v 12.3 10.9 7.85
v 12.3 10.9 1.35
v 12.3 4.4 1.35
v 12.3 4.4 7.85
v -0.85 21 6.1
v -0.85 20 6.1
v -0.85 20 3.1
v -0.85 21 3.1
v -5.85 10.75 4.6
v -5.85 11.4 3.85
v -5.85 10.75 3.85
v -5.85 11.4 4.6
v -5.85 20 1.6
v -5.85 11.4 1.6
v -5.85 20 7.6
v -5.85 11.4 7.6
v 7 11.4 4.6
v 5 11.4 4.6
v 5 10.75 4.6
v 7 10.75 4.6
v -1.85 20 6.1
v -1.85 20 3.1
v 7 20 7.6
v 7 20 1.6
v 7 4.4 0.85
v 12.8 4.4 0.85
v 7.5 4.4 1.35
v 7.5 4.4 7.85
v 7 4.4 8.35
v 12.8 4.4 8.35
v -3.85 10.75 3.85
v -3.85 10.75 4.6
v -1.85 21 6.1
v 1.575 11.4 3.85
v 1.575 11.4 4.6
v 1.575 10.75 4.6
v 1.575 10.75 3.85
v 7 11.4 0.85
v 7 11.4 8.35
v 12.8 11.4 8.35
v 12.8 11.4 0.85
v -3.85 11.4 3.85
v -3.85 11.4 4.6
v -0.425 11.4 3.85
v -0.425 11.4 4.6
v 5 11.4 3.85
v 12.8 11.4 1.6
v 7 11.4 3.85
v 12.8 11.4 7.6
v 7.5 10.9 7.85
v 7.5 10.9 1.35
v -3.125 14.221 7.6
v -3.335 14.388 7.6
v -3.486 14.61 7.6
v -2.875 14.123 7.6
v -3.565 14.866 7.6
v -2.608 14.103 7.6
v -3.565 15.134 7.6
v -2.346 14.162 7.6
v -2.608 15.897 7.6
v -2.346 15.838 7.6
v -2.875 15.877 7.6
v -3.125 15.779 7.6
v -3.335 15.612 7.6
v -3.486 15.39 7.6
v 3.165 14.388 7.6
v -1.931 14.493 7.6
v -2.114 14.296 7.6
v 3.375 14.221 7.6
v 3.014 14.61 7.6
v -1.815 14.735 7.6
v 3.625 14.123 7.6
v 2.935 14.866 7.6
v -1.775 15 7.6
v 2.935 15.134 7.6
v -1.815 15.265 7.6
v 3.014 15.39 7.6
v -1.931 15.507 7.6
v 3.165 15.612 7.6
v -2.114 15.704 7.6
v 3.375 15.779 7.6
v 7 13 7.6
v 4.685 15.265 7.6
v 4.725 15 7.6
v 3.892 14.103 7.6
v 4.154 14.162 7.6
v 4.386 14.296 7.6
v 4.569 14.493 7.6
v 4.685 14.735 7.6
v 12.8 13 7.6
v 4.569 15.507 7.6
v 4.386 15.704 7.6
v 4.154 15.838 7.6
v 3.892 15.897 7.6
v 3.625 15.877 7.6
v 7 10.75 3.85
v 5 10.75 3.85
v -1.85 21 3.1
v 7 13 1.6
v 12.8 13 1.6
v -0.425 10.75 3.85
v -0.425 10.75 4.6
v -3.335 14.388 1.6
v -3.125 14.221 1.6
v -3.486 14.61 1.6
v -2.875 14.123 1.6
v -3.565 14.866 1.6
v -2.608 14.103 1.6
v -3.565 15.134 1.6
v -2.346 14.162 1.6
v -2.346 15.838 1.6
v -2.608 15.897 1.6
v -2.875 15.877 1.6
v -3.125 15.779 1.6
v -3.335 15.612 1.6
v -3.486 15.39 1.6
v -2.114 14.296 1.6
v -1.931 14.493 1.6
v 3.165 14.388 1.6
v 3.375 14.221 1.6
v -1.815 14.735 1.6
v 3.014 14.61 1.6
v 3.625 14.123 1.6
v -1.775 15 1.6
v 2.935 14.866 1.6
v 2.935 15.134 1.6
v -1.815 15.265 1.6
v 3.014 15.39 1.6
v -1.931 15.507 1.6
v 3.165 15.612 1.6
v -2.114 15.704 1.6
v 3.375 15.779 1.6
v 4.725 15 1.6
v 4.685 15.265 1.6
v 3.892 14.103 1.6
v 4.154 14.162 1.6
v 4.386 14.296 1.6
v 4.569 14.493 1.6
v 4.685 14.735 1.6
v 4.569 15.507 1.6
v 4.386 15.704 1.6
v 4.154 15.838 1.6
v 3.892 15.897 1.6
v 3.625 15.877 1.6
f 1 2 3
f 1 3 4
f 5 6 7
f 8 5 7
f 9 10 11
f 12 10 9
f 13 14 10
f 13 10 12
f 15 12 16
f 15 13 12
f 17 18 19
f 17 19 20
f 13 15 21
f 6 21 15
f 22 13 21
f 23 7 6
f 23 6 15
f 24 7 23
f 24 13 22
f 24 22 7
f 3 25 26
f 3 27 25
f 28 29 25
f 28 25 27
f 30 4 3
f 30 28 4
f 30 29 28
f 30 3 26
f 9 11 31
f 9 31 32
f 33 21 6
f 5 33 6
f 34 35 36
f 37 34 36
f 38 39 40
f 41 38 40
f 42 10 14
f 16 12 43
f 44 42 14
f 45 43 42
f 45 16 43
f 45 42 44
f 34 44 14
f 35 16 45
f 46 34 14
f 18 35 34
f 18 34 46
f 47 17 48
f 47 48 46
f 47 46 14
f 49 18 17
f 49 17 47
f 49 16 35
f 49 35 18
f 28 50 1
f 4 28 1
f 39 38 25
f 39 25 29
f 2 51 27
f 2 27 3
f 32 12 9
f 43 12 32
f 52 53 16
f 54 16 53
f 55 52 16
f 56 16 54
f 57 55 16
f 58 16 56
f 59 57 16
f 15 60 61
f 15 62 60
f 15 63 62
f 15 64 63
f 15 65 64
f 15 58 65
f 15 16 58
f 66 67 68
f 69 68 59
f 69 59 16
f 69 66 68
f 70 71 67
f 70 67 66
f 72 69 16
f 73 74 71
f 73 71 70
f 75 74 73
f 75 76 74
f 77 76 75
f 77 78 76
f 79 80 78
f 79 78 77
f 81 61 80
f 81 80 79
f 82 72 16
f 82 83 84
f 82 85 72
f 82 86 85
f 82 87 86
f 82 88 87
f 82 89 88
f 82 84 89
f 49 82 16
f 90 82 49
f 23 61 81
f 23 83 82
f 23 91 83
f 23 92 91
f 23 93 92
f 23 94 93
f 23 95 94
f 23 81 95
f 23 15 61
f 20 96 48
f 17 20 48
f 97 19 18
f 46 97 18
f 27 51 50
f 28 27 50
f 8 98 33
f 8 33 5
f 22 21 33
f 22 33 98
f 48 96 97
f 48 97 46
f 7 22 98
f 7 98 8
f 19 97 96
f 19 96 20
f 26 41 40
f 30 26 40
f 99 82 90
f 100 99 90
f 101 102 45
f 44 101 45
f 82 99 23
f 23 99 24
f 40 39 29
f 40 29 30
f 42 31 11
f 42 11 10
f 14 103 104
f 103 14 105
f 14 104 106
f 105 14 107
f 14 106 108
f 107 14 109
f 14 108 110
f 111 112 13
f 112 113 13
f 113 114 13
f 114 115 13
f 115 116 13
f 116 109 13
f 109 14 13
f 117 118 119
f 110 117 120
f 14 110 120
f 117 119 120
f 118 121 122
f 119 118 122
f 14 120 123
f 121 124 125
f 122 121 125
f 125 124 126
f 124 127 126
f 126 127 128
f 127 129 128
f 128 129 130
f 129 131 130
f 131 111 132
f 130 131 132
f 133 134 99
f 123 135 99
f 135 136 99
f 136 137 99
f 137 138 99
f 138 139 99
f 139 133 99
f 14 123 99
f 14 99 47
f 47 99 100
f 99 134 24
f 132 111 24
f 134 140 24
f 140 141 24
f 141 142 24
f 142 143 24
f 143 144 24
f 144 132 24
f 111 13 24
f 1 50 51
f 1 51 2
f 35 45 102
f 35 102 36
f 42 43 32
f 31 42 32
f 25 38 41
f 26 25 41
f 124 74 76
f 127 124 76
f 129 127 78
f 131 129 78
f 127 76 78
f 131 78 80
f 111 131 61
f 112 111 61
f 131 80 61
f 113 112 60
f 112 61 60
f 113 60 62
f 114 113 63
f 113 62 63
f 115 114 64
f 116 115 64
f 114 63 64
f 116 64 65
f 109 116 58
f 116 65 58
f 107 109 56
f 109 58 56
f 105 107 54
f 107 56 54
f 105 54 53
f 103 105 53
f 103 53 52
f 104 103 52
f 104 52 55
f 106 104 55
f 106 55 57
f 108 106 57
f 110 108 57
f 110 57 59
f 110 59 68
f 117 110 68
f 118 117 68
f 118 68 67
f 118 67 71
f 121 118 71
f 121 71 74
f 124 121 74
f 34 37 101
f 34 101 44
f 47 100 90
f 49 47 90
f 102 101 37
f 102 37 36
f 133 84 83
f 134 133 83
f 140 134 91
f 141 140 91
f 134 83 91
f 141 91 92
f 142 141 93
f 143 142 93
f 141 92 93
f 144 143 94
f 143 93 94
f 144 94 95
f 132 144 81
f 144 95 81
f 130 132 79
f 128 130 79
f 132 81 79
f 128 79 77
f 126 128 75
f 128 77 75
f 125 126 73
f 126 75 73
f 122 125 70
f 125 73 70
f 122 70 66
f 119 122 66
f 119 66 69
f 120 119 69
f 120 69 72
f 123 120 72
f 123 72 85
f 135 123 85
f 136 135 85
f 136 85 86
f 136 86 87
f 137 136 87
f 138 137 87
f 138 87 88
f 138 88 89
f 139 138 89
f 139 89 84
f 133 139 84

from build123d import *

# Parameters (mm, degrees)
SKETCH1_R           = 1.5
BOSS_EXTRUDE1_DEPTH = 1.6
SKETCH2_W           = 12.85
SKETCH2_H           = 10
BOSS_EXTRUDE2_DEPTH = 6
SKETCH3_W           = 12.85
SKETCH3_H           = 3
CUT_EXTRUDE1_DEPTH  = 3
CUT_EXTRUDE3_DEPTH  = 3
SKETCH5_W           = 2.25
SKETCH5_H           = 2.25
CUT_EXTRUDE4_DEPTH  = 17
BOSS_EXTRUDE4_DEPTH = 4.75
SKETCH11_W          = 12.85
SKETCH11_H          = 10
CUT_EXTRUDE8_DEPTH  = 4.75
SKETCH_1_W          = 10
SKETCH_1_H          = 7
EXTRUDE_1_DEPTH     = 5.8
CUT_EXTRUDE_1_DEPTH = 19
SKETCH_4_R          = 0.9
CUT_EXTRUDE_2_DEPTH = 7
SKETCH_5_W          = 18.65
SKETCH_5_H          = 6
EXTRUDE_3_DEPTH     = 1.6
SKETCH_6_W          = 5.8
SKETCH_6_H          = 7.5
EXTRUDE_4_DEPTH     = 7
SKETCH_2_W          = 1
SKETCH_2_H          = 3
EXTRUDE_2_DEPTH     = 1
SHELL_1_T           = -0.5


with BuildPart() as part:
    # Sketch1 → Boss-Extrude1 (new body)
    with BuildSketch(Plane.XY):
        with BuildLine():
            Line((-7, 20), (7, 20))
            ThreePointArc((7, 20), (8.414213562, 19.414213562), (9, 18))
            Line((9, 18), (9, 2))
            ThreePointArc((9, 2), (8.414213562, 0.585786438), (7, 0))
            Line((7, 0), (-7, 0))
            ThreePointArc((-7, 0), (-8.414213562, 0.585786438), (-9, 2))
            Line((-9, 2), (-9, 18))
            ThreePointArc((-9, 18), (-8.414213562, 19.414213562), (-7, 20))
        make_face()
        with Locations((7, 5)):
            Circle(SKETCH1_R, mode=Mode.SUBTRACT)
        with Locations((-7, 5)):
            Circle(SKETCH1_R, mode=Mode.SUBTRACT)
    extrude(amount=BOSS_EXTRUDE1_DEPTH)

    # Sketch2 → Boss-Extrude2 (add)
    with BuildSketch(Plane.XY.offset(1.6)):
        with Locations((0.575, 15)):
            Rectangle(SKETCH2_W, SKETCH2_H)
    extrude(amount=BOSS_EXTRUDE2_DEPTH)

    # Sketch3 → Cut-Extrude1 (cut)
    with BuildSketch(Plane.XY.offset(7.6)):
        with Locations((0.575, 11.5)):
            Rectangle(SKETCH3_W, SKETCH3_H)
    extrude(amount=-CUT_EXTRUDE1_DEPTH, mode=Mode.SUBTRACT)

    # Sketch4 → Cut-Extrude3 (cut)
    with BuildSketch(Plane.XY.offset(4.6)):
        Polygon((5, 13), (1.575, 13), (1.575, 10), (5, 10), (5, 11.5), align=None)
        Polygon((-0.425, 13), (-3.85, 13), (-3.85, 11.5), (-3.85, 10), (-0.425, 10), align=None)
    extrude(amount=-CUT_EXTRUDE3_DEPTH, mode=Mode.SUBTRACT)

    # Sketch5 → Cut-Extrude4 (cut, through all)
    with BuildSketch(Plane(origin=(7, 0, 0), x_dir=(0, 0, -1), z_dir=(1, 0, 0))):
        with Locations((-2.725, 11.875)):
            Rectangle(SKETCH5_W, SKETCH5_H)
    extrude(amount=-CUT_EXTRUDE4_DEPTH, mode=Mode.SUBTRACT)

    # Sketch10 → Boss-Extrude4 (add)
    with BuildSketch(Plane.XY.offset(7.6)):
        Polygon((6.995, 23.262214419), (-5.85, 20), (-5.45, 20), (6.995, 23.16062736), align=None)
    extrude(amount=-BOSS_EXTRUDE4_DEPTH)

    # Sketch11 → Cut-Extrude8 (cut)
    with BuildSketch(Plane(origin=(0, 20, 0), x_dir=(1, 0, 0), z_dir=(0, 1, 0))):
        with Locations((0.575, -2.6)):
            Rectangle(SKETCH11_W, SKETCH11_H)
    extrude(amount=CUT_EXTRUDE8_DEPTH, mode=Mode.SUBTRACT)

    # 草图1 → 凸台-拉伸1 (add)
    with BuildSketch(Plane.XY.offset(1.6)):
        with Locations((-1, 1.5)):
            Rectangle(SKETCH_1_W, SKETCH_1_H)
    extrude(amount=EXTRUDE_1_DEPTH)

    # 草图3 → 切除-拉伸1 (cut, through all)
    with BuildSketch(Plane.ZY.offset(9)):
        Polygon((1.6, 18), (1.6, 10.75), (10.36696293, 10.75), (10.36696293, -5.882154517), (-1.752130291, -5.882154517), (-1.752130291, 20.931214204), (1.6, 20.931214204), align=None)
    extrude(amount=-CUT_EXTRUDE_1_DEPTH, mode=Mode.SUBTRACT)

    # 草图4 → 切除-拉伸2 (cut, through all)
    with BuildSketch(Plane.XY.offset(7.6)):
        with Locations((-2.675, 15)):
            Circle(SKETCH_4_R)
        with Locations((3.825, 15)):
            Circle(SKETCH_4_R)
    extrude(amount=-CUT_EXTRUDE_2_DEPTH, mode=Mode.SUBTRACT)

    # 草图5 → 凸台-拉伸3 (add)
    with BuildSketch(Plane.XZ.offset(-13)):
        with Locations((3.475, 4.6)):
            Rectangle(SKETCH_5_W, SKETCH_5_H)
    extrude(amount=EXTRUDE_3_DEPTH)

    # 草图2 → 凸台-拉伸2 (add)
    with BuildSketch(Plane(origin=(0, 20, 0), x_dir=(1, 0, 0), z_dir=(0, 1, 0))):
        with Locations((-1.35, -4.6)):
            Rectangle(SKETCH_2_W, SKETCH_2_H)
    extrude(amount=EXTRUDE_2_DEPTH)


with BuildPart() as body_2:
    # 草图6 → 凸台-拉伸4 (new body)
    with BuildSketch(Plane.XZ.offset(-11.4)):
        with Locations((9.9, 4.6)):
            Rectangle(SKETCH_6_W, SKETCH_6_H)
    extrude(amount=EXTRUDE_4_DEPTH)

    # 抽壳1
    shell_1_openings = [body_2.faces().sort_by_distance(p)[0] for p in [
        (9.9, 4.4, 4.6),
    ]]
    offset(amount=SHELL_1_T, openings=shell_1_openings, kind=Kind.INTERSECTION)


solid = Compound([part.part, body_2.part])
